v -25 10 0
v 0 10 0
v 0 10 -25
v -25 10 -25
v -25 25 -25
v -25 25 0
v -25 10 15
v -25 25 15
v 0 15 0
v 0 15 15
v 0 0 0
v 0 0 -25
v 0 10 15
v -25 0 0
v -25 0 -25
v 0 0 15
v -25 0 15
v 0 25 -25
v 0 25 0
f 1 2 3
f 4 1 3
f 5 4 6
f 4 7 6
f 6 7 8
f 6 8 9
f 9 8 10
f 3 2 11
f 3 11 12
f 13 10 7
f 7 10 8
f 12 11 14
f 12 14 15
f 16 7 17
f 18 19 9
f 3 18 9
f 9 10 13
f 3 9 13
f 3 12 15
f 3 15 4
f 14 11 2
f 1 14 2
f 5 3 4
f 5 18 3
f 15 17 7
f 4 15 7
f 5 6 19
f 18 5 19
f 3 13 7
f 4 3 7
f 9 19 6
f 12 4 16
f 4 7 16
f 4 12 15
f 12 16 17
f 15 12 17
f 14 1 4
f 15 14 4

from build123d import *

# Parameters (mm, degrees)
BOSS_EXTRUDE1_DEPTH  = 15
SKETCH2_W            = 15
SKETCH2_H            = 5
BOSS_EXTRUDE2_DEPTH  = 25
BOSS_EXTRUDE3_DEPTH  = 15
BOSS_EXTRUDE27_DEPTH = 25
SKETCH12_W           = 25
SKETCH12_H           = 10
BOSS_EXTRUDE36_DEPTH = 25


with BuildPart() as part:
    # Sketch1 → Boss-Extrude1 (new body)
    with BuildSketch(Plane.XY):
        Polygon((-25, 10), (-25, 0), (0, 0), align=None)
    extrude(amount=BOSS_EXTRUDE1_DEPTH)



with BuildPart() as body_2:
    # Sketch2 → Boss-Extrude2 (new body)
    with BuildSketch(Plane.ZY.offset(25)):
        with Locations((7.5, 12.5)):
            Rectangle(SKETCH2_W, SKETCH2_H)
    extrude(amount=-BOSS_EXTRUDE2_DEPTH)

    # Sketch3 → Boss-Extrude3 (add)
    with BuildSketch(Plane.XY.offset(15)):
        Polygon((-25, 15), (-25, 25), (0, 15), align=None)
    extrude(amount=-BOSS_EXTRUDE3_DEPTH)


with BuildPart() as part_1:
    add(part.part)

    add(body_2.part)  # Boss-Extrude27 merges body 2
    # Sketch4 → Boss-Extrude27 (add)
    with BuildSketch(Plane(origin=(0, 0, 0), x_dir=(-1, 0, 0), z_dir=(0, 0, -1))):
        Polygon((0, 10), (25, 10), (25, 25), (0, 15), align=None)
        Polygon((0, 25), (0, 15), (25, 25), align=None)
        Polygon((25, 0), (25, 10), (0, 0), align=None)
    extrude(amount=BOSS_EXTRUDE27_DEPTH)


with BuildPart() as body_2_2:
    # Sketch12 → Boss-Extrude36 (new body)
    with BuildSketch(Plane(origin=(0, 0, 0), x_dir=(0, 0, -1), z_dir=(1, 0, 0))):
        with Locations((12.5, 5)):
            Rectangle(SKETCH12_W, SKETCH12_H)
    extrude(amount=-BOSS_EXTRUDE36_DEPTH)


solid = Compound([part_1.part, body_2_2.part])
